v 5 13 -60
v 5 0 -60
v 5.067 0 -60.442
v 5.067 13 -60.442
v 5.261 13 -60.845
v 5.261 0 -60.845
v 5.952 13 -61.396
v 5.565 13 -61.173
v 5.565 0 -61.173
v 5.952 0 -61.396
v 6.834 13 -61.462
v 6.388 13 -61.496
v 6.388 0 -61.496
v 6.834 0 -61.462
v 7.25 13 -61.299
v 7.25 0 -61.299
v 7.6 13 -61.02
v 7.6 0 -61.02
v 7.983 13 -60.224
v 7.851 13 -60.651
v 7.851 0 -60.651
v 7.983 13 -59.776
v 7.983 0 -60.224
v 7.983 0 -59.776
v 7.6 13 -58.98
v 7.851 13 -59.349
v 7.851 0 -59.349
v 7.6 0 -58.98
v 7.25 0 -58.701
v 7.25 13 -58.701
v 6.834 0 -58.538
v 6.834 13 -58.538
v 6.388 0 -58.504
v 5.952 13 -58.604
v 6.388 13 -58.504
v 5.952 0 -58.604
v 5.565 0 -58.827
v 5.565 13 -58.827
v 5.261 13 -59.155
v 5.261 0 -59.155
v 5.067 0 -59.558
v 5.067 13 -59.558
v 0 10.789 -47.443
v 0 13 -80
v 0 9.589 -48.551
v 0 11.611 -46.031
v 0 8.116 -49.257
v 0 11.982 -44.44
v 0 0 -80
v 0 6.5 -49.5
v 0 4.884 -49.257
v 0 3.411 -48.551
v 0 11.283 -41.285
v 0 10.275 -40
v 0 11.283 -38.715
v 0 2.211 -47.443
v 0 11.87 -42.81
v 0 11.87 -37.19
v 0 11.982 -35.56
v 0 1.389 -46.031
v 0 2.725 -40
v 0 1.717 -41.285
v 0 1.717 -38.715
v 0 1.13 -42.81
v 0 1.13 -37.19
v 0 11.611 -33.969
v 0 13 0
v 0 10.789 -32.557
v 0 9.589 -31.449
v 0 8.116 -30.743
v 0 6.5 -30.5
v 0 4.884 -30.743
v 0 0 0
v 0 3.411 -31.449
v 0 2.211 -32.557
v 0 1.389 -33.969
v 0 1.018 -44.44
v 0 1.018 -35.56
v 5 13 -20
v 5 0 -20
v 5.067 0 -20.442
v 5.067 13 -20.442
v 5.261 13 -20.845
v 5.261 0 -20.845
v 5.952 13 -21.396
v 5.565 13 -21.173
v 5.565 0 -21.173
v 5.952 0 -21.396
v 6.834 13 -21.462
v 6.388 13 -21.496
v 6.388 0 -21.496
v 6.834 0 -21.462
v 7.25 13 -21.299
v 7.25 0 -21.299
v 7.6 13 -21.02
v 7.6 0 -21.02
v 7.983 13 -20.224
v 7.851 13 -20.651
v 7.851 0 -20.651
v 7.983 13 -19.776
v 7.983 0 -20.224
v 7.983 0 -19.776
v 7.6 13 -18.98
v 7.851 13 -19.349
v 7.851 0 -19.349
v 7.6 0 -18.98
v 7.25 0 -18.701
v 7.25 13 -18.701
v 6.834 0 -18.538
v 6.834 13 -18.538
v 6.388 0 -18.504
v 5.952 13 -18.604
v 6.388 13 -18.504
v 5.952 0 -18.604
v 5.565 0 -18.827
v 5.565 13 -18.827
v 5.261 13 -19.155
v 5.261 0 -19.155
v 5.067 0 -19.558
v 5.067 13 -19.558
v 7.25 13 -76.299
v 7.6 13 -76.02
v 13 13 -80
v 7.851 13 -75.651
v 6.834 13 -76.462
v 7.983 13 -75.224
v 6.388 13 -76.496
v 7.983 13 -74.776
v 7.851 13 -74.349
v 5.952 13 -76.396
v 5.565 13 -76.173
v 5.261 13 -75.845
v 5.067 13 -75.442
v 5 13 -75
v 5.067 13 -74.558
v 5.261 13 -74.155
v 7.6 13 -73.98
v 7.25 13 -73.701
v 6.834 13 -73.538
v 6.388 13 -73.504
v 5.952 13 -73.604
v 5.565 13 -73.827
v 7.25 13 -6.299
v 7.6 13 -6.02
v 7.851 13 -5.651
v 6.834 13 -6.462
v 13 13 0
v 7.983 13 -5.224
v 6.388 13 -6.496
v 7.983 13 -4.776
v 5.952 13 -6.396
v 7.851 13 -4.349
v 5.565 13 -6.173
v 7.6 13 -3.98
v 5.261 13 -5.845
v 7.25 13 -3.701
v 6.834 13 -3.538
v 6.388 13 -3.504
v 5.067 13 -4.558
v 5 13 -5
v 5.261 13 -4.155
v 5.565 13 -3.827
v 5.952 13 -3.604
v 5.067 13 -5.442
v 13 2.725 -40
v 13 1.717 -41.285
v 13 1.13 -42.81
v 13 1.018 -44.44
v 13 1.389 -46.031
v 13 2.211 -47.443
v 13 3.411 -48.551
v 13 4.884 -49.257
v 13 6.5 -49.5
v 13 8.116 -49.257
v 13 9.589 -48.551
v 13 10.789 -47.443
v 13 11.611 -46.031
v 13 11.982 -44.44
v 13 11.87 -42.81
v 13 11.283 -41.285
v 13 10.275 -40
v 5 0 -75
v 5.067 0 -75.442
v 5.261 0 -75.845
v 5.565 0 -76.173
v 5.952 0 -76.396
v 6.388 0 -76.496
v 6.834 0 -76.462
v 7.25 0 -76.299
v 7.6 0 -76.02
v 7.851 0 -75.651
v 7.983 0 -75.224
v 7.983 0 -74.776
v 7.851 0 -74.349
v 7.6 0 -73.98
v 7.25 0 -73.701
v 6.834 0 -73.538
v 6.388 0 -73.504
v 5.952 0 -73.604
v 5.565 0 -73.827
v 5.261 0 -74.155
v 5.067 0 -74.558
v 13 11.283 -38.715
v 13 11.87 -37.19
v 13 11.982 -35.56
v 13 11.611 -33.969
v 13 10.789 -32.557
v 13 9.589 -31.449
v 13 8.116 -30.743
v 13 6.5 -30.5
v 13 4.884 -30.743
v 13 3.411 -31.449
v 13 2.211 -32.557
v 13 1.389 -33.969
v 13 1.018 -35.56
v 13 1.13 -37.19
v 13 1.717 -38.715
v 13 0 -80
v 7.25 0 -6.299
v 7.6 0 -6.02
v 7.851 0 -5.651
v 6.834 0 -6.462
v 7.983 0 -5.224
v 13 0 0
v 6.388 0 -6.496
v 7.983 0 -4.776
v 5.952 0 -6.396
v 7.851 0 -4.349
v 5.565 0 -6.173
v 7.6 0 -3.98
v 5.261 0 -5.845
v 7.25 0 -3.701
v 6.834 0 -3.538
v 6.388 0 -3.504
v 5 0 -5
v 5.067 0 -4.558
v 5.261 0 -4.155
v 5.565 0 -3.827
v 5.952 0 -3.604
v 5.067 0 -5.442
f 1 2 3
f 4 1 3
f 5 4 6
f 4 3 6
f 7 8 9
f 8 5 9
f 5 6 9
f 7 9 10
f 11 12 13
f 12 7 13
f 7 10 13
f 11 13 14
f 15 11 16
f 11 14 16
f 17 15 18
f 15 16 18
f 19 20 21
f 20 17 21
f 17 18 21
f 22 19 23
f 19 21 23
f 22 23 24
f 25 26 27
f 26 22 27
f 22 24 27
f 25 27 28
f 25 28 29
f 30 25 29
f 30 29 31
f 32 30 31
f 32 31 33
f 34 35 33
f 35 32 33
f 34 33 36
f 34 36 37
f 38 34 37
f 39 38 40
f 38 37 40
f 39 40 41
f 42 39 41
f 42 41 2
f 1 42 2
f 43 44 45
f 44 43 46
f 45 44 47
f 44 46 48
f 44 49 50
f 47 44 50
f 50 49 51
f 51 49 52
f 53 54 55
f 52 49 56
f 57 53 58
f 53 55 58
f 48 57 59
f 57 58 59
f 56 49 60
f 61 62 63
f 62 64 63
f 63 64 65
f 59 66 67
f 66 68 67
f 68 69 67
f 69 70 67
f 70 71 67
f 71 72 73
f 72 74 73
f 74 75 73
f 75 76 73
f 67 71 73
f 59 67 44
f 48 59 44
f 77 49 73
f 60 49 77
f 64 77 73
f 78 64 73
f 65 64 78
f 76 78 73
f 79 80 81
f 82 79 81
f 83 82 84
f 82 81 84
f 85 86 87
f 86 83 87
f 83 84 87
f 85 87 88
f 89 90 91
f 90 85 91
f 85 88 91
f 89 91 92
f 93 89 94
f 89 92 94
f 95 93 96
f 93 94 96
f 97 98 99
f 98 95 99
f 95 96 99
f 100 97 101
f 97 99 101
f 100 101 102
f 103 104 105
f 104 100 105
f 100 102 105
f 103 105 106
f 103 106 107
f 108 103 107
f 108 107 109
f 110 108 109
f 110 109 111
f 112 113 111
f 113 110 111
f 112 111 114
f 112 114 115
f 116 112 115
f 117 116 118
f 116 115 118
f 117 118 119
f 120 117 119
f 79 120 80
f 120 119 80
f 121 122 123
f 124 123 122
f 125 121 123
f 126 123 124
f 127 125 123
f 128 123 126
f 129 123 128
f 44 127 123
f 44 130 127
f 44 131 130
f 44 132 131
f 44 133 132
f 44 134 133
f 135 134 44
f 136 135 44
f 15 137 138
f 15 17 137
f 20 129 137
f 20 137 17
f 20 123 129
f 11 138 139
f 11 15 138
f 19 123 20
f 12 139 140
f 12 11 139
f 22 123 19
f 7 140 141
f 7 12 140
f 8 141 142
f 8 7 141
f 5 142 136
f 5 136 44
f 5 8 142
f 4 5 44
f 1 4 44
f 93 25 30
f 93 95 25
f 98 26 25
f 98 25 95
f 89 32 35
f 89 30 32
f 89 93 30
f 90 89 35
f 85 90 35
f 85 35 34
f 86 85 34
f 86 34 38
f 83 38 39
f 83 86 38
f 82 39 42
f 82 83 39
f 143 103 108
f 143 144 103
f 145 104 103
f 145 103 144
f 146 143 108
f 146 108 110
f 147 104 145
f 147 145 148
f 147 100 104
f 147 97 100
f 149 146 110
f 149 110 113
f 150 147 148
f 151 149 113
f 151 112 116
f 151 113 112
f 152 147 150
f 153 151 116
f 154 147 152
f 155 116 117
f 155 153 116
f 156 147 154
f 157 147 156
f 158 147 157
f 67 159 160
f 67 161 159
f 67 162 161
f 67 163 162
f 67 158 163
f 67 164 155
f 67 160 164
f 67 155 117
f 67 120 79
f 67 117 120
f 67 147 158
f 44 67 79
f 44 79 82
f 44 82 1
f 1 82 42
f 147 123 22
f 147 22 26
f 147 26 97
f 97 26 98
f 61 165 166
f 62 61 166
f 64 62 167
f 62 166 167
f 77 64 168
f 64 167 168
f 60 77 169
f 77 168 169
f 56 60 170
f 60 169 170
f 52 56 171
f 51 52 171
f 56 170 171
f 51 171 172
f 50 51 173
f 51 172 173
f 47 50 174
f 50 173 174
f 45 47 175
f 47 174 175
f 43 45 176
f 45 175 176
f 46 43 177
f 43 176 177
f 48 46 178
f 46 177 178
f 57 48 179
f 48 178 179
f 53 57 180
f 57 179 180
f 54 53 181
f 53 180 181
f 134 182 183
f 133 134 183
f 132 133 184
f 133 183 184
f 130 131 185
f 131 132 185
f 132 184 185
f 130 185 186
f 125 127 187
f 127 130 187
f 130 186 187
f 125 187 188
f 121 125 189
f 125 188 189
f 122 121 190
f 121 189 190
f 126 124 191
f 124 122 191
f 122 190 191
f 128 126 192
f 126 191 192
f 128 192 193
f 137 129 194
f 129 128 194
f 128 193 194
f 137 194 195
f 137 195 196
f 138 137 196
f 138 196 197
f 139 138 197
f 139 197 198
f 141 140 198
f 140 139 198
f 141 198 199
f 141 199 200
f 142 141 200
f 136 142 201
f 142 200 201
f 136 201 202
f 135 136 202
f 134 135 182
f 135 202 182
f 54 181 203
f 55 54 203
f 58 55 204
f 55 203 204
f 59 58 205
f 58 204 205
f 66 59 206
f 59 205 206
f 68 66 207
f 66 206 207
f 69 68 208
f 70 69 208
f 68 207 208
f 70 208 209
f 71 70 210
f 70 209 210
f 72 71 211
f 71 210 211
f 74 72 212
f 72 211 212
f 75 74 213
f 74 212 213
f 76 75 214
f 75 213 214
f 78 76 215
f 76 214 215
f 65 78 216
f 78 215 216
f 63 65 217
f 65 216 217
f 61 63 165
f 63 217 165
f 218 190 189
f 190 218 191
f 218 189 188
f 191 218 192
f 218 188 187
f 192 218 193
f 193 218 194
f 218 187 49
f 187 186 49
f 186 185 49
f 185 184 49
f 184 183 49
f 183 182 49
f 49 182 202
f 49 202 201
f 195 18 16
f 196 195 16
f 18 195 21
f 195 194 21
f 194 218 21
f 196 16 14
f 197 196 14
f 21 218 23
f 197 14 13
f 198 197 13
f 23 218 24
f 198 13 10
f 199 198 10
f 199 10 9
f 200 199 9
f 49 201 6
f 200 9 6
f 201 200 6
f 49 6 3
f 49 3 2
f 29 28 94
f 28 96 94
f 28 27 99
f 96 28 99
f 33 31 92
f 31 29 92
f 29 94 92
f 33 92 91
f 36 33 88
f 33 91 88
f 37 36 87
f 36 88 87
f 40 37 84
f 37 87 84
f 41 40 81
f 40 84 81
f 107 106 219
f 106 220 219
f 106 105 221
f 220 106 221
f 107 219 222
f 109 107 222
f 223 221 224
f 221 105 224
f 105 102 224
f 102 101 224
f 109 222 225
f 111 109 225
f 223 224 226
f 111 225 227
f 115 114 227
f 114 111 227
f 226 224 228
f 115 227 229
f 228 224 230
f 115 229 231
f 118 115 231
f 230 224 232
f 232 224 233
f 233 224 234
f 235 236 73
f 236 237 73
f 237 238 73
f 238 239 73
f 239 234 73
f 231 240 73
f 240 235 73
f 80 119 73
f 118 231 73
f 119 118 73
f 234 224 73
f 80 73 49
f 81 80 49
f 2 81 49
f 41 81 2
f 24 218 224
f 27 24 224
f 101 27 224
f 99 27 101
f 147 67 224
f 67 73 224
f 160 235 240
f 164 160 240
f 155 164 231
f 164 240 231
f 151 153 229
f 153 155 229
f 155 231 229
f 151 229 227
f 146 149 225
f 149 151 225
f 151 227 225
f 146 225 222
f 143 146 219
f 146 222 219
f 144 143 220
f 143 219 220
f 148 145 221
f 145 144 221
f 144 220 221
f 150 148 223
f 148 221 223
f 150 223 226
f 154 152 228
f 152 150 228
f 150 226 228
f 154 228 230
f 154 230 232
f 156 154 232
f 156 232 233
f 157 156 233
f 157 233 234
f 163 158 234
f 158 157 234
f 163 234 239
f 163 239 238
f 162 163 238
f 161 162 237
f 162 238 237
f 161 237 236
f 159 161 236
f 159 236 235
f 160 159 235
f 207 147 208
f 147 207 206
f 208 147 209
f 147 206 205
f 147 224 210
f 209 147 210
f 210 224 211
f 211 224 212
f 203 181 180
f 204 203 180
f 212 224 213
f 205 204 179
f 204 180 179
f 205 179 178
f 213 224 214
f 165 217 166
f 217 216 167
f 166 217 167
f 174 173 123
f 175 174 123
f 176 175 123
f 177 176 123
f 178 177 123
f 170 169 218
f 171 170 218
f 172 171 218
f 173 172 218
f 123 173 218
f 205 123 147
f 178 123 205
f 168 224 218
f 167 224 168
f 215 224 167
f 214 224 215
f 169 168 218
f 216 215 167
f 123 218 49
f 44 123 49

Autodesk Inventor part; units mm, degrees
ref_plane "YZ Plane" through (0, 0, 0) normal (1, 0, 0) x (0, 1, 0)
ref_plane "XZ Plane" through (0, 0, 0) normal (0, 1, 0) x (-1, 0, 0)
ref_plane "XY Plane" through (0, 0, 0) normal (0, 0, 1) x (1, 0, 0)
sketch "Sketch1" plane through (0, 0, 0) normal (0, 1, 0) x (-1, 0, 0)
  line L0 (0, 0) -> (-13, 0)
  line L1 (0, 0) -> (-13, 0)
  line L2 (-13, 0) -> (-13, -80)
  line L3 (-13, -80) -> (0, -80)
  line L4 (0, -80) -> (0, 0)
  circle A0 centre (-6.5, -5) radius 1.5
  circle A1 centre (-6.5, -20) radius 1.5
  circle A2 centre (-6.5, -75) radius 1.5
  circle A3 centre (-6.5, -60) radius 1.5
  dimension "d1" = 13
  dimension "d2" = 80
  dimension "d4" = 3
  dimension "d6" = 3
extrude "Extrusion1" add sketch "Sketch1" along normal blind 13
sketch "Sketch2" plane through (13, 0, 0) normal (1, 0, 0) x (0, 0, -1)
  line L0 (0, 13) -> (80, 13) projected
  line L1 (40, 13) -> (40, 0)
  line L2 (0, 0) -> (80, 0) projected
  arc A0 (40, 10.2749) -> (40, 2.7251) centre (36, 6.5) ccw
  arc A1 (40, 2.7251) -> (40, 10.2749) centre (44, 6.5) ccw
  dimension "d10" = 11
extrude "Extrusion2" cut sketch "Sketch2" against normal blind 13
sketch "Sketch3" plane through (0, 13, 0) normal (0, 1, 0) x (1, 0, 0)
  line L0 (13, 80) -> (0, 80) projected
  circle A0 centre (6.5, 75) radius 1.5 projected
  line L1 (13, 0) -> (13, 80) projected
  point P0 (0, 0)
  point P1 (6.5, 80)
  dimension "d13" = 5
  dimension "d14" = 6.5
properties part number "cella di carico"
